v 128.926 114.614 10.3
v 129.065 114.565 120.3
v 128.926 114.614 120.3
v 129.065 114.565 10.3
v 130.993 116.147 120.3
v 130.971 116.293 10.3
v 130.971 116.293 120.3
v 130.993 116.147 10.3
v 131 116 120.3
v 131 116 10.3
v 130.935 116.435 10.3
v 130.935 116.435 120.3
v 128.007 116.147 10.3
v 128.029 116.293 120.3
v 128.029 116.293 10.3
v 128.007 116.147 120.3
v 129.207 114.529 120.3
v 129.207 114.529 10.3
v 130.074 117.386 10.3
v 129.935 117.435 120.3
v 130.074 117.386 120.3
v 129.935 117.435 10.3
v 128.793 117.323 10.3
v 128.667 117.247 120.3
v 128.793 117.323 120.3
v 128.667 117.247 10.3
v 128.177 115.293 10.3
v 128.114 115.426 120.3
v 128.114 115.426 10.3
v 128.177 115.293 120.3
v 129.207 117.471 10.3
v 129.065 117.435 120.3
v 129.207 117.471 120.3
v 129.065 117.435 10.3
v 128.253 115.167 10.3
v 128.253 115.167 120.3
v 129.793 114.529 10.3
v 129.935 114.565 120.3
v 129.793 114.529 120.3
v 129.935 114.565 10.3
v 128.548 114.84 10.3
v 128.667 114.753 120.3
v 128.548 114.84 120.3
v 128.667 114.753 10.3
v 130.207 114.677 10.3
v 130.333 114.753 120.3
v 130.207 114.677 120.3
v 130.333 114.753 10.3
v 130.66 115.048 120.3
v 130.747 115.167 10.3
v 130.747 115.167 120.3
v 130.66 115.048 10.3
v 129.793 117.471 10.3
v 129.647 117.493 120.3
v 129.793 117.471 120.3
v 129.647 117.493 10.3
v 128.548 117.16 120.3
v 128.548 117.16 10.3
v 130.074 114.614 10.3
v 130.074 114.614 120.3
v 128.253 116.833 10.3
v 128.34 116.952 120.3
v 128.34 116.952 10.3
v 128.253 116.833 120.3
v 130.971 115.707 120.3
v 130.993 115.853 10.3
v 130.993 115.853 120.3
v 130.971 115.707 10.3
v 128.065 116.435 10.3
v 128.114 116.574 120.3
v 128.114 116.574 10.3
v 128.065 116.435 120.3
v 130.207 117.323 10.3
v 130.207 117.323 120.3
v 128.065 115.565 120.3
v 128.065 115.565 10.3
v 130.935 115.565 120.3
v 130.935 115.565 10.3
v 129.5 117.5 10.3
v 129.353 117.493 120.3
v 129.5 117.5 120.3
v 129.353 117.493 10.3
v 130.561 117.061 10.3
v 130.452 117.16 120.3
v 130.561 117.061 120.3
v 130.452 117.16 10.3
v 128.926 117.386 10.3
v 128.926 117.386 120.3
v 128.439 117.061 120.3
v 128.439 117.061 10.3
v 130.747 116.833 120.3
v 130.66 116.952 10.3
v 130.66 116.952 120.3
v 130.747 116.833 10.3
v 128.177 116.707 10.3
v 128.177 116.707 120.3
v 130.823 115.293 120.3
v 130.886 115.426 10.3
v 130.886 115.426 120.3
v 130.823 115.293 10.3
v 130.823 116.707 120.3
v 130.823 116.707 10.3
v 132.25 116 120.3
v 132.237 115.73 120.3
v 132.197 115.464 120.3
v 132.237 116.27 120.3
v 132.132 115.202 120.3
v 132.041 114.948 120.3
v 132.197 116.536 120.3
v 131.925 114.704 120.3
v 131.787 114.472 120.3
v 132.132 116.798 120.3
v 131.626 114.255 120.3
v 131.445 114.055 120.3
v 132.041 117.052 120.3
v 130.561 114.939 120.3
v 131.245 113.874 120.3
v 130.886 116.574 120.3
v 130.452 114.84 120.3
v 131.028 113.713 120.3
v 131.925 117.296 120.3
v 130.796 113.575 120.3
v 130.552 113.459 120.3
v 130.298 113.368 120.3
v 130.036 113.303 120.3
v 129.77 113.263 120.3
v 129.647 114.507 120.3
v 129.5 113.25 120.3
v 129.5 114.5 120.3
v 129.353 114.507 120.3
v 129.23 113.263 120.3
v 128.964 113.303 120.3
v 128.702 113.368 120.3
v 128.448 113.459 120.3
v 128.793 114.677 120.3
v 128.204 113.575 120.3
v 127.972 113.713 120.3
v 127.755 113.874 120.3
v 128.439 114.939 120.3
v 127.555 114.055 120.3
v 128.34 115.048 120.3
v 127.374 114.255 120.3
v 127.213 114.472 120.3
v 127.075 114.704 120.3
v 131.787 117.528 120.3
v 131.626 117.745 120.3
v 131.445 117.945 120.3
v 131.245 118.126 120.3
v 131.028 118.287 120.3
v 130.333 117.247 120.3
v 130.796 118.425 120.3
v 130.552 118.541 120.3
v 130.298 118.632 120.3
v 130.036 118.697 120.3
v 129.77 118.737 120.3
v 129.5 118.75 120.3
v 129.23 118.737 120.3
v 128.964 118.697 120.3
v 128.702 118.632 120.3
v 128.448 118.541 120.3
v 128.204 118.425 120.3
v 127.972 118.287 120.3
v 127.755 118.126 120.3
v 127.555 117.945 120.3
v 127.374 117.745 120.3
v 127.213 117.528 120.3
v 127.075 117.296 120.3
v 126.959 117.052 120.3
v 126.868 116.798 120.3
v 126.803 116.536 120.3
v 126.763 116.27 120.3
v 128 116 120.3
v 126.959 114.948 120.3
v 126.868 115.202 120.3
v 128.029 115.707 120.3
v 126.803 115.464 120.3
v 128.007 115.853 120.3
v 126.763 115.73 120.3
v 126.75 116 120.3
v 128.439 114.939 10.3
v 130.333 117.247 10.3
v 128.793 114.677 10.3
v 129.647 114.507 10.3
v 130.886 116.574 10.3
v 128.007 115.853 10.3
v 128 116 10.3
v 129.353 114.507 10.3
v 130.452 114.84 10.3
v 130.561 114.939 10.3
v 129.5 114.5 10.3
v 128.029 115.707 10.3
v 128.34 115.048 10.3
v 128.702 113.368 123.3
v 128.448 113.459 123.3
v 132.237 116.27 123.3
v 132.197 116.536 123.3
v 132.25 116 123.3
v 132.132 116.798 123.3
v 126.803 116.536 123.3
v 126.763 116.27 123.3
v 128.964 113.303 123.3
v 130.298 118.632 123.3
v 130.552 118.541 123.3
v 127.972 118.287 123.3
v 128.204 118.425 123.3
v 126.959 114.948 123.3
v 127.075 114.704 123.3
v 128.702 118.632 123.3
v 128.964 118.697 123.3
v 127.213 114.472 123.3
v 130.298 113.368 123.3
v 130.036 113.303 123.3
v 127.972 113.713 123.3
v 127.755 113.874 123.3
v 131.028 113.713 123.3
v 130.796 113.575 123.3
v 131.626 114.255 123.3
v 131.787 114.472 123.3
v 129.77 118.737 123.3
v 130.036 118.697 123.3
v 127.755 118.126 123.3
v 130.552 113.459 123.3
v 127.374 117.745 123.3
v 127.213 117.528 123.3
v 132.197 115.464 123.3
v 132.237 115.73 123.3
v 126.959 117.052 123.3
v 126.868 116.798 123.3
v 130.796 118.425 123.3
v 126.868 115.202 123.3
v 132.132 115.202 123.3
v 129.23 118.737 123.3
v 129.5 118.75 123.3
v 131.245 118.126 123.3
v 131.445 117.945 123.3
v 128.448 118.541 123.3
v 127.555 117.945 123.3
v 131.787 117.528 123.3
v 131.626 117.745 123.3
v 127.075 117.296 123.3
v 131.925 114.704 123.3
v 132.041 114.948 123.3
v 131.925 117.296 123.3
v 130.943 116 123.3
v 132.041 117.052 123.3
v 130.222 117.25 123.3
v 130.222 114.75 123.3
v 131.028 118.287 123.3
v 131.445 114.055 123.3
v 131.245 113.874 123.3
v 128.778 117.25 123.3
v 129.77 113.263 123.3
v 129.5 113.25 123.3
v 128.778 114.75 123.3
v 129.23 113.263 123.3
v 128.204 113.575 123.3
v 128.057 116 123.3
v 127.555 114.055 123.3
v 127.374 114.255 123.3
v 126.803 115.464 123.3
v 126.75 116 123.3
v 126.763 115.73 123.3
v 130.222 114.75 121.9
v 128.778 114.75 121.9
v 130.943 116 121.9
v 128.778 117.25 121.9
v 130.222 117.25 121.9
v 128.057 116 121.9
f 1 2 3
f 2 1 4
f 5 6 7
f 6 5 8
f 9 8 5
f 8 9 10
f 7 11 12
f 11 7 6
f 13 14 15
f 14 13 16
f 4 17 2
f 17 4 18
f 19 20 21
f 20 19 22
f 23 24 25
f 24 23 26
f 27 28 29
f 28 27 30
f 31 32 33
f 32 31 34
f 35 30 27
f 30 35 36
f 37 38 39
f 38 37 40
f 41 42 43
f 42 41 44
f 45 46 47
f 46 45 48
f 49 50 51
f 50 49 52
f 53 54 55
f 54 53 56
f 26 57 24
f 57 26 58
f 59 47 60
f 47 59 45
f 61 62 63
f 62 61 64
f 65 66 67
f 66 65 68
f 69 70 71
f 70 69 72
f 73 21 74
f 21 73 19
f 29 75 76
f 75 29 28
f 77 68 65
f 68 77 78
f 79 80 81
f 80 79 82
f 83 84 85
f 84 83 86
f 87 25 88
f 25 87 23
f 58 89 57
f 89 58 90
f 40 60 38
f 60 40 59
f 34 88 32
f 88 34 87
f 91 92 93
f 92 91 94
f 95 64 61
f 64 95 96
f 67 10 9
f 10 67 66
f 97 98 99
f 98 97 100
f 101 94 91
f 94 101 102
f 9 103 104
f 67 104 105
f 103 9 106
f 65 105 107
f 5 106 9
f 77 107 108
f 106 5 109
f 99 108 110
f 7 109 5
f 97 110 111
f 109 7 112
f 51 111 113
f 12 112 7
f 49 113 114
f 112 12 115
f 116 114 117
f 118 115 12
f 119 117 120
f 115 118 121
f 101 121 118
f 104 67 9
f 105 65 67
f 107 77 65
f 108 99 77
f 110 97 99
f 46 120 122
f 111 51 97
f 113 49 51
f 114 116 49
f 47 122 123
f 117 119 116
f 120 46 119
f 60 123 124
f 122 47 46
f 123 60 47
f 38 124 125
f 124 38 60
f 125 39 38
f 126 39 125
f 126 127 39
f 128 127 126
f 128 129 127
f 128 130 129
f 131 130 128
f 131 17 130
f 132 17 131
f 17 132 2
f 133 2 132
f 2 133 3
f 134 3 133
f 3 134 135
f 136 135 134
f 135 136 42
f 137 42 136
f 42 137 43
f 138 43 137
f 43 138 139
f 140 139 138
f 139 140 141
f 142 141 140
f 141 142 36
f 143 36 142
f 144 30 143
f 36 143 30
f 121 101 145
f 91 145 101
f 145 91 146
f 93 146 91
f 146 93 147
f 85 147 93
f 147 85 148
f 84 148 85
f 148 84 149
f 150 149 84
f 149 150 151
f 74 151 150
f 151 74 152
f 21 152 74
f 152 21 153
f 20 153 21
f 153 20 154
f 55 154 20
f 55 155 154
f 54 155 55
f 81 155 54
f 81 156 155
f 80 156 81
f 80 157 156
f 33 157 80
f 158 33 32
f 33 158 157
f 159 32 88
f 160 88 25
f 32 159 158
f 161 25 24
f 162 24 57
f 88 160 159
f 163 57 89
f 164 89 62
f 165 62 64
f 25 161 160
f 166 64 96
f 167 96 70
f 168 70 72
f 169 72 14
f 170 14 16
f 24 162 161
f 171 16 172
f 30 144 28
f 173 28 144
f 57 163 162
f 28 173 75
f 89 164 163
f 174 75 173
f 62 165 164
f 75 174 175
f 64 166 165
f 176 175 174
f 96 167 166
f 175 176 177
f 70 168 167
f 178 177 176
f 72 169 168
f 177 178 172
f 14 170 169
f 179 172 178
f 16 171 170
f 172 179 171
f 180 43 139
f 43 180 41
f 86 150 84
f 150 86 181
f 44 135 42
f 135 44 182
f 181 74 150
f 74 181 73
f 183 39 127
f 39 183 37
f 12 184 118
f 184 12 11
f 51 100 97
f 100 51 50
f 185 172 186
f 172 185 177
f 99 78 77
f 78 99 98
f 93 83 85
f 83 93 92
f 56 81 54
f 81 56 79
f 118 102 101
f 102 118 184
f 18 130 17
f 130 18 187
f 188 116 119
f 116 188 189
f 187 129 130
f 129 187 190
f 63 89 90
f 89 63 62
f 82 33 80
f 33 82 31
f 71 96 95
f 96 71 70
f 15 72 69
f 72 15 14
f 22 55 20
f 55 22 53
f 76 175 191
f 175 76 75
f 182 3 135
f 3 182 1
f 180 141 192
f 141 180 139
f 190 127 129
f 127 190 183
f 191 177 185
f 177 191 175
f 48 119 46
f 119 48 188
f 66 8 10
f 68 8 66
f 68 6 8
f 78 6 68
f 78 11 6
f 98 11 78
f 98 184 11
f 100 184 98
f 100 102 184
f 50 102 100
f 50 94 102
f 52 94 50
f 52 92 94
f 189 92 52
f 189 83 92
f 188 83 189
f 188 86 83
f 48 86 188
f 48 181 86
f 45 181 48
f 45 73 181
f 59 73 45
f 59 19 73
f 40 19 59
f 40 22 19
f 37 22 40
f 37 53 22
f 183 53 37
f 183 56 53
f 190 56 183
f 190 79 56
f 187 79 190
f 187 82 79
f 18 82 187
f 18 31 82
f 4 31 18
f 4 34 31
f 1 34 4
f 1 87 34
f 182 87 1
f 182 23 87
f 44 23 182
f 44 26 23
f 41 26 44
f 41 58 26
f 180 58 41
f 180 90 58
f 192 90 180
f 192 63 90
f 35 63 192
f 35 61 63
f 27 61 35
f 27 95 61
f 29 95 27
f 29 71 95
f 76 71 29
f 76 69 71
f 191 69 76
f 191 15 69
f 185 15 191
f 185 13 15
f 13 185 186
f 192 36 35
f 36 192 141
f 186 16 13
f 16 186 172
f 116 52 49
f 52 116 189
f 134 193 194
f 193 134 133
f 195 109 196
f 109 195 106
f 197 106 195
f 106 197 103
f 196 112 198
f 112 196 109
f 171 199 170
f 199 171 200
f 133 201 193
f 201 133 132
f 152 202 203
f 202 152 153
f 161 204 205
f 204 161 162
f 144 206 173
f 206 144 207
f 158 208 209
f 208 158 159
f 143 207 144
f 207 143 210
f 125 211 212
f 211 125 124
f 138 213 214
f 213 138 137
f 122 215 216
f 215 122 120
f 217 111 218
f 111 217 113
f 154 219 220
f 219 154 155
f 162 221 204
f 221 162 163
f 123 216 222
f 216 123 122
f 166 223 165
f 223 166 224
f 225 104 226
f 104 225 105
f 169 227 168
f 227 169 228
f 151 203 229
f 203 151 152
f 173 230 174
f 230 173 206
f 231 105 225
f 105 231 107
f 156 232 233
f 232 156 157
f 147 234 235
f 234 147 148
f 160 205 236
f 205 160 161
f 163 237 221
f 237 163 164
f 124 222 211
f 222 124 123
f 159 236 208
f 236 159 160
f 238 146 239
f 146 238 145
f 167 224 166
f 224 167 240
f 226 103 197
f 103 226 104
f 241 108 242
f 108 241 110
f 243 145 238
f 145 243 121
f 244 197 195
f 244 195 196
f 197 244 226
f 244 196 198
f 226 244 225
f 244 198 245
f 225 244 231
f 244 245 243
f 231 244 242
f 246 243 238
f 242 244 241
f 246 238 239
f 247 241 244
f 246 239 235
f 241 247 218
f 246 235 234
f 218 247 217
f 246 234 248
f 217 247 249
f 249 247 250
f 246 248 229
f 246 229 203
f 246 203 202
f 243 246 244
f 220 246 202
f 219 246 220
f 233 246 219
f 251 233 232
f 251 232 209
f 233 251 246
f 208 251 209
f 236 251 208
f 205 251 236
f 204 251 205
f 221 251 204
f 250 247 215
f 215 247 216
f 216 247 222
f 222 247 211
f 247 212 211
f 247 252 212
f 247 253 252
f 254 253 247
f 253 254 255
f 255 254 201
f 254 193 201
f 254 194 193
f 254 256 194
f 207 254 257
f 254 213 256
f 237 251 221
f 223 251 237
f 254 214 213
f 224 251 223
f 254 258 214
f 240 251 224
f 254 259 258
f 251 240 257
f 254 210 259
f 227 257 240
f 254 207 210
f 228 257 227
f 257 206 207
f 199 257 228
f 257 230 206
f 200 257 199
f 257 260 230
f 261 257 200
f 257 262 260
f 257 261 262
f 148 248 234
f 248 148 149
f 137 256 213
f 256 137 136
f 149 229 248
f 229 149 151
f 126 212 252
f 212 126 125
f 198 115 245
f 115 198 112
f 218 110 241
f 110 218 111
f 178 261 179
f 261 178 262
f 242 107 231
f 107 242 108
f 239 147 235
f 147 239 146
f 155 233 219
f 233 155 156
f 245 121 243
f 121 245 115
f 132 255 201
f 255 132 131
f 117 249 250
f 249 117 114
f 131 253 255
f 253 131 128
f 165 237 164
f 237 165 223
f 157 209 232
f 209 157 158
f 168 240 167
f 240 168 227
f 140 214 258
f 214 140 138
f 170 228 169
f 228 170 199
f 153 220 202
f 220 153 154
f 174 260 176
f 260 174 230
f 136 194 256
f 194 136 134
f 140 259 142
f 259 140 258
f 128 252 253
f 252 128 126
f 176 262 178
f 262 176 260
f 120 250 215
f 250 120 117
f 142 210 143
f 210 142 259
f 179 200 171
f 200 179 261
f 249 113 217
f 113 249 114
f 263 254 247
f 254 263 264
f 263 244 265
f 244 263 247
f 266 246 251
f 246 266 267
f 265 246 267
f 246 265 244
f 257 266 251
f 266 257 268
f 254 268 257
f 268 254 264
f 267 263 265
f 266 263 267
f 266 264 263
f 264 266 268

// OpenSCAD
// Generated from the same CSG operations as STEP. Rebuild with spec/build_parent_hand_service.py.
difference(){union(){translate([129.5,116,10.3]) cylinder(r=1.5,h=110,$fn=64);translate([129.5,116,120.3]) cylinder(r=2.75,h=3,$fn=64);}translate([129.5,116,121.9]) cylinder(r=1.4433756729740643,h=1.5,$fn=6);}
